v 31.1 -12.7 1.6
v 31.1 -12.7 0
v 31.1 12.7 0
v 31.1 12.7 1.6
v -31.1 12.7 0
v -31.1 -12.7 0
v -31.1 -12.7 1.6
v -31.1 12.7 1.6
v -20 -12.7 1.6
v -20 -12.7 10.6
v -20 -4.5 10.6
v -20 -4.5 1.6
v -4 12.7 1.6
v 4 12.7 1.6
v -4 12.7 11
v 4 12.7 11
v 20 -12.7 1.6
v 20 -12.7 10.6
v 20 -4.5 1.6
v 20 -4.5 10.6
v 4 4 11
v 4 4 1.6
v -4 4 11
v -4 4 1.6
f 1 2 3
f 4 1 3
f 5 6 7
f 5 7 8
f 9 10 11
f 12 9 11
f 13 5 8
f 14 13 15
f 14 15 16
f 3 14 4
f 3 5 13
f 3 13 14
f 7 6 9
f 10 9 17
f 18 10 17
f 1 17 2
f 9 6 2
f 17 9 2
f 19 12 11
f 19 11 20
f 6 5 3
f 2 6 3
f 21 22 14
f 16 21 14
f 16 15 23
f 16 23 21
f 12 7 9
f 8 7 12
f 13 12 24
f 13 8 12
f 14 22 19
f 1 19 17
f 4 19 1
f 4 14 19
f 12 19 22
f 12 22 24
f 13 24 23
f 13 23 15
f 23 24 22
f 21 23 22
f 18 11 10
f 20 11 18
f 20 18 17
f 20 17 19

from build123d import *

# Parameters (mm, degrees)
SKETCH1_W           = 62.2
SKETCH1_H           = 25.4
PCB_DEPTH           = 1.6
SKETCH2_W           = 40
SKETCH2_H           = 8.2
SERVO_HEADERS_DEPTH = 9
SKETCH3_W           = 8
SKETCH3_H           = 8.7
V_TERMINAL_DEPTH    = 9.4


with BuildPart() as part:
    # Sketch1 → PCB (new body)
    with BuildSketch(Plane.XY):
        Rectangle(SKETCH1_W, SKETCH1_H)
    extrude(amount=PCB_DEPTH)

    # Sketch2 → Servo_headers (add)
    with BuildSketch(Plane.XY.offset(1.6)):
        with Locations((0, -8.6)):
            Rectangle(SKETCH2_W, SKETCH2_H)
    extrude(amount=SERVO_HEADERS_DEPTH)

    # Sketch3 → V+_terminal (add)
    with BuildSketch(Plane.XY.offset(1.6)):
        with Locations((0, 8.35)):
            Rectangle(SKETCH3_W, SKETCH3_H)
    extrude(amount=V_TERMINAL_DEPTH)


solid = part.part
